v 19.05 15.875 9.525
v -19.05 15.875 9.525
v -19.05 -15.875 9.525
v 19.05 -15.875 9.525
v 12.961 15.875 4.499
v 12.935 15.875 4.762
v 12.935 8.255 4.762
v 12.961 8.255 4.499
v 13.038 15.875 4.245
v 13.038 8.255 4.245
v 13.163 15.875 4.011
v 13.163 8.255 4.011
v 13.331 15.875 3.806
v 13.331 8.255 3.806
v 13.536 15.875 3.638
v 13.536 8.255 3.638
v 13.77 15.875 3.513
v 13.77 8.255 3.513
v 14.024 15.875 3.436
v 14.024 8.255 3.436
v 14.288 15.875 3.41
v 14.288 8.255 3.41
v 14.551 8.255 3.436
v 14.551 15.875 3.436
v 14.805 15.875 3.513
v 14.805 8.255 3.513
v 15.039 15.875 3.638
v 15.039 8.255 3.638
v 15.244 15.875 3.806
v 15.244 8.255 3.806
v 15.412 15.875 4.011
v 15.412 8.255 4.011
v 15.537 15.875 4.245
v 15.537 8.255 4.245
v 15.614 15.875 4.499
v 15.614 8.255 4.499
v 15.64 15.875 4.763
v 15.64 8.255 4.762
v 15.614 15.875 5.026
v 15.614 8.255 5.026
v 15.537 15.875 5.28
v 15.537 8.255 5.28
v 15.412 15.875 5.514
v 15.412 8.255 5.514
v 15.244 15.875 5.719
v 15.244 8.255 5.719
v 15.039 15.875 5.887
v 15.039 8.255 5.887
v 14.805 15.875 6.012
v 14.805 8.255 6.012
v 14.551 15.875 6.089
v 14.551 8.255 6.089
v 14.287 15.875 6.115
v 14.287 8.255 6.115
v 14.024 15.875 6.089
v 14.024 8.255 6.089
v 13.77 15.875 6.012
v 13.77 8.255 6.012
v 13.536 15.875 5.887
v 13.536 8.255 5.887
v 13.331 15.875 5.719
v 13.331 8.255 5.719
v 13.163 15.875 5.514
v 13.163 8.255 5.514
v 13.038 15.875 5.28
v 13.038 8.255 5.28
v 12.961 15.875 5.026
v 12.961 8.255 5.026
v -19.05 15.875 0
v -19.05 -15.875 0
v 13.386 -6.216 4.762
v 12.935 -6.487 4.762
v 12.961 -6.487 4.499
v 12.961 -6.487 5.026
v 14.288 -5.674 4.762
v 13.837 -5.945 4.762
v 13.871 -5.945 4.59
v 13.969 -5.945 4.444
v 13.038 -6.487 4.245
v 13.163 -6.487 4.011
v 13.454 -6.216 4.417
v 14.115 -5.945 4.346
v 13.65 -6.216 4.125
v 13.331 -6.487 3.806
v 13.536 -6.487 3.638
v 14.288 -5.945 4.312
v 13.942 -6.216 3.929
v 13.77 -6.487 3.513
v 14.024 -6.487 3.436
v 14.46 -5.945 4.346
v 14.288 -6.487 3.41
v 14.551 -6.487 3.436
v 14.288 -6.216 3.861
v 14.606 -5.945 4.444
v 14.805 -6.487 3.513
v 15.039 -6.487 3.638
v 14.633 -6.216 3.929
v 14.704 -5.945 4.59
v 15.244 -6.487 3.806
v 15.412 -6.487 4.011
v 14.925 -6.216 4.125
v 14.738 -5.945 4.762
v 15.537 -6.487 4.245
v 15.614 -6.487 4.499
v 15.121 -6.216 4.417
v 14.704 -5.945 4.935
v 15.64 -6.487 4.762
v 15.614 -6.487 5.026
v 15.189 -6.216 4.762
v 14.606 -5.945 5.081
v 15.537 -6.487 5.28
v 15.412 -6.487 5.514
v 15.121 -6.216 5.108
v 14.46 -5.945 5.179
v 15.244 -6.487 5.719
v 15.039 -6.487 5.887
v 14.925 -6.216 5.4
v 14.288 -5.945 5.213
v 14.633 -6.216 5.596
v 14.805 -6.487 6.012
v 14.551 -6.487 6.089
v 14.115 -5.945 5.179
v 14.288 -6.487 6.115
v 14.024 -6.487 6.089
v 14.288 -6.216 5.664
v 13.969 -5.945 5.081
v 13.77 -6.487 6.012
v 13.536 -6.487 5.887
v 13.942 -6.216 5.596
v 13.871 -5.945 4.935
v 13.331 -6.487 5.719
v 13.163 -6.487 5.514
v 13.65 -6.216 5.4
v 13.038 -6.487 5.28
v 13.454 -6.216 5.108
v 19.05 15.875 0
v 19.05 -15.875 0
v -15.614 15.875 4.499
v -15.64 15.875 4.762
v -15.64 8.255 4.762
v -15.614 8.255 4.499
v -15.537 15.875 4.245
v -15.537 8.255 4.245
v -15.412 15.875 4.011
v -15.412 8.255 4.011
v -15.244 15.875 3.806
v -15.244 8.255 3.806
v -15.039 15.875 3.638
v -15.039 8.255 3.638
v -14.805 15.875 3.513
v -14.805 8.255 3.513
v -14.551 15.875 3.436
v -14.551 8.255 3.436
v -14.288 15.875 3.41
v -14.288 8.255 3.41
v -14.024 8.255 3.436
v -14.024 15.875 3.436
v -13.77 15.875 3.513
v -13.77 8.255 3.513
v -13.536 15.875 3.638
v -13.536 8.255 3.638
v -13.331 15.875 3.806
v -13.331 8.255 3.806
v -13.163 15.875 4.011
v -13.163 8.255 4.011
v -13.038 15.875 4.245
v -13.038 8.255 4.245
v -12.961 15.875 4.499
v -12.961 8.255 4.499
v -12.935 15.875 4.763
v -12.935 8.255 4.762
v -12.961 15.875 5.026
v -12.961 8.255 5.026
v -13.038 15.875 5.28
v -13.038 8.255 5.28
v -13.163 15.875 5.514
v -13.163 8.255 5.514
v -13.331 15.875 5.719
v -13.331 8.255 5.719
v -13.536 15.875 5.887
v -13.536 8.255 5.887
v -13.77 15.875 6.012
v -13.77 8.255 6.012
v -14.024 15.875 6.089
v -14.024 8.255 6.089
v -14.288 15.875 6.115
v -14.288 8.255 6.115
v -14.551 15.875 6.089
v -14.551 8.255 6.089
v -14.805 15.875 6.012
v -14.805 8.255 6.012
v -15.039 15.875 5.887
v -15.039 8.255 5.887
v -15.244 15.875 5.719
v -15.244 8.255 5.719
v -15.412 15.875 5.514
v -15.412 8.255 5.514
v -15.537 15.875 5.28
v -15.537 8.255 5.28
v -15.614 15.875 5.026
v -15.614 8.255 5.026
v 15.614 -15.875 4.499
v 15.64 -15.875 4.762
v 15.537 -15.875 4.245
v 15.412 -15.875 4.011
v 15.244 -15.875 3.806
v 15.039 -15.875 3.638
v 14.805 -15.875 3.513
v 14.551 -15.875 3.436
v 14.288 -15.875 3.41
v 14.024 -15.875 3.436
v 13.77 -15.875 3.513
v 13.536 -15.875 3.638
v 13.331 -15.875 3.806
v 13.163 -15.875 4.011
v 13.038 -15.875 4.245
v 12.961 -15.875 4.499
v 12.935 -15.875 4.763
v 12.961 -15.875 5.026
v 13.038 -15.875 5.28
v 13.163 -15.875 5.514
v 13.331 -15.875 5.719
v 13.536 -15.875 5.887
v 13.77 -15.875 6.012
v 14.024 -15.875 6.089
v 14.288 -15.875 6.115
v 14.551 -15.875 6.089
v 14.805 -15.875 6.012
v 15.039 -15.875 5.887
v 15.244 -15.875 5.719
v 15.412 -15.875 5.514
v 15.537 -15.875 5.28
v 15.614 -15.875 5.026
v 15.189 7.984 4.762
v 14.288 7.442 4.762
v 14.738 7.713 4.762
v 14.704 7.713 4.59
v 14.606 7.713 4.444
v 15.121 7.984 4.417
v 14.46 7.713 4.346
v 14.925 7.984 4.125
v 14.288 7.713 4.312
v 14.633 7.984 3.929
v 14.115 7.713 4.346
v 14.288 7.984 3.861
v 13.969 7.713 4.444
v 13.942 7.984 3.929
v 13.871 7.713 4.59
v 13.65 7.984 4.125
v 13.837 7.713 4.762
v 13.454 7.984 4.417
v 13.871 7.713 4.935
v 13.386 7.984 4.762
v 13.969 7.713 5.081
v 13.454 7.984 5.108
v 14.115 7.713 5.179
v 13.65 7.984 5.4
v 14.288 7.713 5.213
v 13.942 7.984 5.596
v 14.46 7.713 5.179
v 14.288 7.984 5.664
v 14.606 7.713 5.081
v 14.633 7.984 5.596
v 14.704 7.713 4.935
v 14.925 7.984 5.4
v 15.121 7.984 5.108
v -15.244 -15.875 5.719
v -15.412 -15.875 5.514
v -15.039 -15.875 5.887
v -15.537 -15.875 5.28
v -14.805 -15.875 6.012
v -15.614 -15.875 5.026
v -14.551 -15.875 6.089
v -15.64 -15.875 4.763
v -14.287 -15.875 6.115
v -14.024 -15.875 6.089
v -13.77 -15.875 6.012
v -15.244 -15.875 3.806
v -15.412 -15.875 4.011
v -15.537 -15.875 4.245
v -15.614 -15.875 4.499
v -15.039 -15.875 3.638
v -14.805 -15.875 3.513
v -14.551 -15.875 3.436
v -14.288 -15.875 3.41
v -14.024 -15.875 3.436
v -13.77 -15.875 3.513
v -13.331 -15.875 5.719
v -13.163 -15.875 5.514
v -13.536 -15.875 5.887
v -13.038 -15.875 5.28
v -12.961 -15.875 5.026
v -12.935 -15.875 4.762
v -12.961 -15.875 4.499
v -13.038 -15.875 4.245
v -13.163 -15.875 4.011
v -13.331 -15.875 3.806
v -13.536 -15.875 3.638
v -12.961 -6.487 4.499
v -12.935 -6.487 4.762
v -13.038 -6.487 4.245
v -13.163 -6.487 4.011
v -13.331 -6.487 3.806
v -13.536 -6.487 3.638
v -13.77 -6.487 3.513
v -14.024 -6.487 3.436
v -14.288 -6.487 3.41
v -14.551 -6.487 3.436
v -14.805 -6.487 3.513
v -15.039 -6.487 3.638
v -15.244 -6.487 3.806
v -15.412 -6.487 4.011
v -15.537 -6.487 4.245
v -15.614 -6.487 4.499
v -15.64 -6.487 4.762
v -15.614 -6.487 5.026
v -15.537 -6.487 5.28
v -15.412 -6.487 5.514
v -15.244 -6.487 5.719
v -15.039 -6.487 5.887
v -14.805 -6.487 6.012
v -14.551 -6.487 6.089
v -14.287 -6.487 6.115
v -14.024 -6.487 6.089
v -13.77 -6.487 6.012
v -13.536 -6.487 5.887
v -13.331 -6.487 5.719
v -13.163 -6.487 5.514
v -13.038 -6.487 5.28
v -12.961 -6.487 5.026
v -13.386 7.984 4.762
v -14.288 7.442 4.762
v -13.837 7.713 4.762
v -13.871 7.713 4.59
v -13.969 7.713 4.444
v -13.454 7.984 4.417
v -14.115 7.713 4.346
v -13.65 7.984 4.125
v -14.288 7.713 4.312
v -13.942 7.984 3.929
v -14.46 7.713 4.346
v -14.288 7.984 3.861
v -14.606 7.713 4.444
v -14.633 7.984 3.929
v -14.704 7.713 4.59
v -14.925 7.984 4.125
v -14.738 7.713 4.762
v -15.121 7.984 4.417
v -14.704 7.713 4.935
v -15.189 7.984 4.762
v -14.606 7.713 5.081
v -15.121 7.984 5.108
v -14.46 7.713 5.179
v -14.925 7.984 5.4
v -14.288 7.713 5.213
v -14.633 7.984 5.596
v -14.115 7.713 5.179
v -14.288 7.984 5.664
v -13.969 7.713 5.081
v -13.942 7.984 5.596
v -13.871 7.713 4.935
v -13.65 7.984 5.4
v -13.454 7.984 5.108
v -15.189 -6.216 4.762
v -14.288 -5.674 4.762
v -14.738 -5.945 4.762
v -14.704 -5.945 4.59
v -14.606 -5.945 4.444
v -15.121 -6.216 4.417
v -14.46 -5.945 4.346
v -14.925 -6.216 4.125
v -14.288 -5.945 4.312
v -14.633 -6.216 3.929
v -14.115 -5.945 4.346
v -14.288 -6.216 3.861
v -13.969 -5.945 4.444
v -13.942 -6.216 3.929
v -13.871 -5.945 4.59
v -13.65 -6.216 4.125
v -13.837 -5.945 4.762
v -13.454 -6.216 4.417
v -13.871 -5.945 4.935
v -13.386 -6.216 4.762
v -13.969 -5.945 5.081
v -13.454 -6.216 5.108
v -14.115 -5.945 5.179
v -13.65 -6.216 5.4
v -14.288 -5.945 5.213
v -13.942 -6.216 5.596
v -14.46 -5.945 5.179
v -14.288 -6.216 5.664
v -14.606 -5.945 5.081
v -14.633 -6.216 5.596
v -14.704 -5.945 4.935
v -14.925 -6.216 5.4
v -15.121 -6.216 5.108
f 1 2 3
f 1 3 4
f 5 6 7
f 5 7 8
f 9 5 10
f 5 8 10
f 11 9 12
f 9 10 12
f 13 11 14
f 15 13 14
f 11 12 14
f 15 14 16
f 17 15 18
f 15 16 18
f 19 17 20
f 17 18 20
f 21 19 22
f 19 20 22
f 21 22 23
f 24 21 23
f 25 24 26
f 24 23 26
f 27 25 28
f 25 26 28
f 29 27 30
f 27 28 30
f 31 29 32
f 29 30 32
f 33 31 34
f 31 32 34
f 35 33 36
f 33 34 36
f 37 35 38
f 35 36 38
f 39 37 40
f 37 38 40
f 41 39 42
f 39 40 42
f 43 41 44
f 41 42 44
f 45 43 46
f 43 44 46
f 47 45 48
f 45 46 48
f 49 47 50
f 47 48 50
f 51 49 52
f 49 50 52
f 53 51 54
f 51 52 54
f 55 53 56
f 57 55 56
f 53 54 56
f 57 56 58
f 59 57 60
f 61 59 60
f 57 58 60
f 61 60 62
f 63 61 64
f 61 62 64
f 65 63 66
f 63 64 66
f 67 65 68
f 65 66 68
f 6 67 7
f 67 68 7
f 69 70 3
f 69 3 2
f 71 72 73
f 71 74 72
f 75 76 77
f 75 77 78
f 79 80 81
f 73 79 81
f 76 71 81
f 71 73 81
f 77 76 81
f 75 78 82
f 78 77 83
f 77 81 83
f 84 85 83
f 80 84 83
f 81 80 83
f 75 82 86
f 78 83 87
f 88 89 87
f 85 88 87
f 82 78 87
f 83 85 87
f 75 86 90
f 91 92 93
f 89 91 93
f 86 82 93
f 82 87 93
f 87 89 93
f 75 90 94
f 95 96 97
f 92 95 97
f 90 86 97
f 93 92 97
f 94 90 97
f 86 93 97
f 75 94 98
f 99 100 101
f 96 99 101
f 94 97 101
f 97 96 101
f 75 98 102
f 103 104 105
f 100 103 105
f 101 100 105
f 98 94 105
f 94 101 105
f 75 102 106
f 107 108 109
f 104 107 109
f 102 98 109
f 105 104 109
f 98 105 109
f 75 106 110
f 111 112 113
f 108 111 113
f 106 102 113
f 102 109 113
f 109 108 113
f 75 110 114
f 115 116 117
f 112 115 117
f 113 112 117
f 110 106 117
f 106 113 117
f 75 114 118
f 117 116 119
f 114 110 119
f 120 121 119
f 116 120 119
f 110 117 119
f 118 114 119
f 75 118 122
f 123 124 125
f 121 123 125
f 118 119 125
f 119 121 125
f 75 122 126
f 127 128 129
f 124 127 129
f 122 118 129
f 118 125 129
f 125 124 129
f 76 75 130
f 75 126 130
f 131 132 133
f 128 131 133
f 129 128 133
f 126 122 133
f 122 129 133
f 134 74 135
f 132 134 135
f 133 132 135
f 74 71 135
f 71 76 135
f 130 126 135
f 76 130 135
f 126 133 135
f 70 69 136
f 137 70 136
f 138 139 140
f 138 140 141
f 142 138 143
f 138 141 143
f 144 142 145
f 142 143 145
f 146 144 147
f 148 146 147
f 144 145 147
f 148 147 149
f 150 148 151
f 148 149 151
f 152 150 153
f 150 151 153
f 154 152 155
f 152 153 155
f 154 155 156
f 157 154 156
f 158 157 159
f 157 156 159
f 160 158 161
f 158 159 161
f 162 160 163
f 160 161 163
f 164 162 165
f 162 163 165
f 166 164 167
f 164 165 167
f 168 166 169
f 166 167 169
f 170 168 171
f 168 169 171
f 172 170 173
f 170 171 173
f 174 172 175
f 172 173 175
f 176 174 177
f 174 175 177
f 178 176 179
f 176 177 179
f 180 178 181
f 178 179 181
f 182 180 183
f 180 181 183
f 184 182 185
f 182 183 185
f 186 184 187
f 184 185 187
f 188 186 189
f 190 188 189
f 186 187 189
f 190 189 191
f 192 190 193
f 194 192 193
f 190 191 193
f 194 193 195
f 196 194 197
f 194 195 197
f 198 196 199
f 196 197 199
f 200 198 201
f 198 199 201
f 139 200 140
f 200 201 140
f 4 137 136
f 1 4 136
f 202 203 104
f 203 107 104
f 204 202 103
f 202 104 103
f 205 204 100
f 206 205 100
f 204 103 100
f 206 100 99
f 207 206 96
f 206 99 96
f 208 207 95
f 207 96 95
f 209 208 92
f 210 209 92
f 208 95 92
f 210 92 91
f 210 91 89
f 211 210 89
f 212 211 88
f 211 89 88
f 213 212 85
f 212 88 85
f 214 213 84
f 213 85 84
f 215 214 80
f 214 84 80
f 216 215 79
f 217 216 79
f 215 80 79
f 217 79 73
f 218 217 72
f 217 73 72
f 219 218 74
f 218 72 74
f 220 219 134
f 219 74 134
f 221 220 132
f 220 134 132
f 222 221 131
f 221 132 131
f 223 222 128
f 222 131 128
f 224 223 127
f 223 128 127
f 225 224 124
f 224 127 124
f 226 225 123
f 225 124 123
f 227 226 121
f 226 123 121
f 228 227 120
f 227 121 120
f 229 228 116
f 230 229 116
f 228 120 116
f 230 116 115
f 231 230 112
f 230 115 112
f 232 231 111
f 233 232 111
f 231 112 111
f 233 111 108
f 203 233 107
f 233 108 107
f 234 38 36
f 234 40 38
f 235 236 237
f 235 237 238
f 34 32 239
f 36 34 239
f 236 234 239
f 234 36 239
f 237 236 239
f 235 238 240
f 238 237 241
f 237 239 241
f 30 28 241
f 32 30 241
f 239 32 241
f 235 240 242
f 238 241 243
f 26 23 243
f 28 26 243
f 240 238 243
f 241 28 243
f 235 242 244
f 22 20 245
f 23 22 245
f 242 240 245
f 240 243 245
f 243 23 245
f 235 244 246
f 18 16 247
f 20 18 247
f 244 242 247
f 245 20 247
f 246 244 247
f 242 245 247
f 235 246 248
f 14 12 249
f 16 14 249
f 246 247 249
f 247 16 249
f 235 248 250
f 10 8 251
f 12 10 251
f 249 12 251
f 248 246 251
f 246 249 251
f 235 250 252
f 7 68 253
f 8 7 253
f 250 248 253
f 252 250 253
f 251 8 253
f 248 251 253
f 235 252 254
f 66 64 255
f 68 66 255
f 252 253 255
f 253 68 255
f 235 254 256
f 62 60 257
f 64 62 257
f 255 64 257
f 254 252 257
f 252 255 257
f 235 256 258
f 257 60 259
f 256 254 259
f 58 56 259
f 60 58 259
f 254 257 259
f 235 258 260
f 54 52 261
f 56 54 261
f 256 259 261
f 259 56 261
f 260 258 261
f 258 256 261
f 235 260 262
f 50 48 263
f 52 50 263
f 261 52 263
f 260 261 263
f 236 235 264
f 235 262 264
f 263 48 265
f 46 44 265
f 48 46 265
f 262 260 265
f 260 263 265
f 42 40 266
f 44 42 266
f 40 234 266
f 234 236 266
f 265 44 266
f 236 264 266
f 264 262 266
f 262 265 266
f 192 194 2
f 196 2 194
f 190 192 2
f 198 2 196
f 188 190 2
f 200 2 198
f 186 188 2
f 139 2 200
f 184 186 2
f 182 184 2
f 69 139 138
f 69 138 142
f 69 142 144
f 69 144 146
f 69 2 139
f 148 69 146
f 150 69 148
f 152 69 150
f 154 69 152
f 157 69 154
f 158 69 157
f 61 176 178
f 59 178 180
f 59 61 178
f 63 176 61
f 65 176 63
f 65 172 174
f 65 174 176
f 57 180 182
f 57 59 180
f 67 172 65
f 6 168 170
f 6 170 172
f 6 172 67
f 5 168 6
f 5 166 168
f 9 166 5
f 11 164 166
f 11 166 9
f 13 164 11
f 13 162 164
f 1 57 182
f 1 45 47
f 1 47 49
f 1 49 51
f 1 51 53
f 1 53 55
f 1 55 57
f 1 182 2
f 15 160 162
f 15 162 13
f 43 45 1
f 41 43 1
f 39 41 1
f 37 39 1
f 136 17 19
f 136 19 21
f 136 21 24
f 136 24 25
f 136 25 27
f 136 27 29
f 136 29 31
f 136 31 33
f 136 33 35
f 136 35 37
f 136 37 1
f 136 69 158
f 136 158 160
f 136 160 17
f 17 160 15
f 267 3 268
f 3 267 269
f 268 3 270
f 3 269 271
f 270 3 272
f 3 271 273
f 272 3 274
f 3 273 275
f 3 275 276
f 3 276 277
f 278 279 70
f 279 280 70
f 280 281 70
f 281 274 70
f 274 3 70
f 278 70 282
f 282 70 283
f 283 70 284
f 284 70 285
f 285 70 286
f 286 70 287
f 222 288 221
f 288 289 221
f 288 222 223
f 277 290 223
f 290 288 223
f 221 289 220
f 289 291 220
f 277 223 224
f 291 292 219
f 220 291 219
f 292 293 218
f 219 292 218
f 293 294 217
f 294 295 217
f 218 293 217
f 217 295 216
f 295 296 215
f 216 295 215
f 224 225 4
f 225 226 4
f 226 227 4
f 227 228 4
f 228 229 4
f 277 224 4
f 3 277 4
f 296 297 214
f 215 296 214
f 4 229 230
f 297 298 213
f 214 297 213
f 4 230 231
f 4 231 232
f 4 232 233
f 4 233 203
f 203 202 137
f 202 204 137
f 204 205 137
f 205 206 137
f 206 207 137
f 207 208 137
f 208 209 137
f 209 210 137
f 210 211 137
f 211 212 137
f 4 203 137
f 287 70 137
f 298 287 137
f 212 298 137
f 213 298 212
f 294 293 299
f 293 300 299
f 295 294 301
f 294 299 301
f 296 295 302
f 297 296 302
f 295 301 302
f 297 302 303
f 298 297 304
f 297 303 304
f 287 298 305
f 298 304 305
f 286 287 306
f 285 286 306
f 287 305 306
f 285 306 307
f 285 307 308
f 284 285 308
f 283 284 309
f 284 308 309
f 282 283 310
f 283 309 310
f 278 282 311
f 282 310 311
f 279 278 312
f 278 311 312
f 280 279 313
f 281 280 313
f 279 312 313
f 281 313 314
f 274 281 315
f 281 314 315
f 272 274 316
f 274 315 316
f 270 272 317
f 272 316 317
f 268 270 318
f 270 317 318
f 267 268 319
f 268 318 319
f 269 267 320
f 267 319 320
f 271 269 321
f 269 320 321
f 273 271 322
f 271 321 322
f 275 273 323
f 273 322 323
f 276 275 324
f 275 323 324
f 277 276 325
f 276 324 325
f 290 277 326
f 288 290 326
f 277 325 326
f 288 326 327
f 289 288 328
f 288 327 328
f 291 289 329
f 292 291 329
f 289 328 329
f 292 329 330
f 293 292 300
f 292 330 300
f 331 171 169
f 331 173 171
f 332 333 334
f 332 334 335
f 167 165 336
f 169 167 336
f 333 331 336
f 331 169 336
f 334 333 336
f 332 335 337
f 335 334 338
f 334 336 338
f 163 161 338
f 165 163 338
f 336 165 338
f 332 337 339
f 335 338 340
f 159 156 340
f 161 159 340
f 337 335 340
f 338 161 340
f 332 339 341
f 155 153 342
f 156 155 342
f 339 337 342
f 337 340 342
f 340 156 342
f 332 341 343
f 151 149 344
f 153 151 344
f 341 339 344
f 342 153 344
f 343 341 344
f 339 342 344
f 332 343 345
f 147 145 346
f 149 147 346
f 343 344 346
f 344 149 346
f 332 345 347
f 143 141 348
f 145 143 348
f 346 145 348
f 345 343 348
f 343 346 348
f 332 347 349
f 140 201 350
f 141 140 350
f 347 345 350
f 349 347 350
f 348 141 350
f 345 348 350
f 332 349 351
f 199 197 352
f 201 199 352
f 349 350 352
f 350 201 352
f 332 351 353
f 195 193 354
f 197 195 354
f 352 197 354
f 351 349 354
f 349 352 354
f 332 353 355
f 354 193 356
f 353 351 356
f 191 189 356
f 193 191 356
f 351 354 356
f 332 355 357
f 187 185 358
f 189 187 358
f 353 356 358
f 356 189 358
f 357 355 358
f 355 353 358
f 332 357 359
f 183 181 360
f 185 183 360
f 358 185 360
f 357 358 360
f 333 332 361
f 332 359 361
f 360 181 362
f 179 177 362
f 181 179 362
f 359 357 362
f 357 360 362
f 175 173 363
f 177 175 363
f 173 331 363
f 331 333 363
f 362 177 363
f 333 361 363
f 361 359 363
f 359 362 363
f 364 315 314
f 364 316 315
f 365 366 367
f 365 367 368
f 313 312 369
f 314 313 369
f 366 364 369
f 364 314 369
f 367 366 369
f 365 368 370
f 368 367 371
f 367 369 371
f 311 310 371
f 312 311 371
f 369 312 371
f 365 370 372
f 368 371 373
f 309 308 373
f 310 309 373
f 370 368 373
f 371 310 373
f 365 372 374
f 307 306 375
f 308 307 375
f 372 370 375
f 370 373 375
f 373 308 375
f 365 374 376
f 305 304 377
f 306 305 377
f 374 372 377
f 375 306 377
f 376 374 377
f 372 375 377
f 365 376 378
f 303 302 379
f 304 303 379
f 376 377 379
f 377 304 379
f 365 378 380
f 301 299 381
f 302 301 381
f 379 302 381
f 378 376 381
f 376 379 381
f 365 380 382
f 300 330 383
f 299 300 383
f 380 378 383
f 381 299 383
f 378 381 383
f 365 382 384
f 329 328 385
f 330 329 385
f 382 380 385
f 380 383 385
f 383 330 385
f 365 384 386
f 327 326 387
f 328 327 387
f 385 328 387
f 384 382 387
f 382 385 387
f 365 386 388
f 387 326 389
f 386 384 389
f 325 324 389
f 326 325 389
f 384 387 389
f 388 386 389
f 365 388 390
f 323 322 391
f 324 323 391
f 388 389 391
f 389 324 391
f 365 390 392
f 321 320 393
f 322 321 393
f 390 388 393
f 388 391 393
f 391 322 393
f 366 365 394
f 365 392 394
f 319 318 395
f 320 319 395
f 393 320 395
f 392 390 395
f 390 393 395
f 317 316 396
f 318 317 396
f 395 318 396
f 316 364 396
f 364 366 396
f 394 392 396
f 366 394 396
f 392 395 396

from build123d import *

# Parameters (mm, degrees)
SKETCH1_W                 = 38.1
SKETCH1_H                 = 31.75
BOSS_EXTRUDE1_DEPTH       = 9.525
F_6_32_TAPPED_HOLE1_D     = 2.7051
F_6_32_TAPPED_HOLE1_DEPTH = 7.62
F_6_32_TAPPED_HOLE1_TIP   = 0.81269403
F_6_32_TAPPED_HOLE2_D     = 2.7051
F_6_32_TAPPED_HOLE2_DEPTH = 9.38784
F_6_32_TAPPED_HOLE2_TIP   = 0.81269403


with BuildPart() as part:
    # Sketch1 → Boss-Extrude1 (new body)
    with BuildSketch(Plane.XY):
        Rectangle(SKETCH1_W, SKETCH1_H)
    extrude(amount=BOSS_EXTRUDE1_DEPTH)

    # #6-32 Tapped Hole1
    with Locations(Plane(origin=(0, 15.875, 0), x_dir=(1, 0, 0), z_dir=(0, 1, 0))):
        with Locations((-14.2875, -4.7625), (14.2875, -4.7625)):
            Hole(F_6_32_TAPPED_HOLE1_D / 2, depth=F_6_32_TAPPED_HOLE1_DEPTH)
            with Locations((0, 0, -(F_6_32_TAPPED_HOLE1_DEPTH + F_6_32_TAPPED_HOLE1_TIP / 2))):  # 118° drill point
                Cone(0, F_6_32_TAPPED_HOLE1_D / 2, F_6_32_TAPPED_HOLE1_TIP, mode=Mode.SUBTRACT)

    # #6-32 Tapped Hole2
    with Locations(Plane(origin=(0, -15.875, 0), x_dir=(-1, 0, 0), z_dir=(0, -1, 0))):
        with Locations((-14.2875, -4.7625), (14.2875, -4.7625)):
            Hole(F_6_32_TAPPED_HOLE2_D / 2, depth=F_6_32_TAPPED_HOLE2_DEPTH)
            with Locations((0, 0, -(F_6_32_TAPPED_HOLE2_DEPTH + F_6_32_TAPPED_HOLE2_TIP / 2))):  # 118° drill point
                Cone(0, F_6_32_TAPPED_HOLE2_D / 2, F_6_32_TAPPED_HOLE2_TIP, mode=Mode.SUBTRACT)


solid = part.part
